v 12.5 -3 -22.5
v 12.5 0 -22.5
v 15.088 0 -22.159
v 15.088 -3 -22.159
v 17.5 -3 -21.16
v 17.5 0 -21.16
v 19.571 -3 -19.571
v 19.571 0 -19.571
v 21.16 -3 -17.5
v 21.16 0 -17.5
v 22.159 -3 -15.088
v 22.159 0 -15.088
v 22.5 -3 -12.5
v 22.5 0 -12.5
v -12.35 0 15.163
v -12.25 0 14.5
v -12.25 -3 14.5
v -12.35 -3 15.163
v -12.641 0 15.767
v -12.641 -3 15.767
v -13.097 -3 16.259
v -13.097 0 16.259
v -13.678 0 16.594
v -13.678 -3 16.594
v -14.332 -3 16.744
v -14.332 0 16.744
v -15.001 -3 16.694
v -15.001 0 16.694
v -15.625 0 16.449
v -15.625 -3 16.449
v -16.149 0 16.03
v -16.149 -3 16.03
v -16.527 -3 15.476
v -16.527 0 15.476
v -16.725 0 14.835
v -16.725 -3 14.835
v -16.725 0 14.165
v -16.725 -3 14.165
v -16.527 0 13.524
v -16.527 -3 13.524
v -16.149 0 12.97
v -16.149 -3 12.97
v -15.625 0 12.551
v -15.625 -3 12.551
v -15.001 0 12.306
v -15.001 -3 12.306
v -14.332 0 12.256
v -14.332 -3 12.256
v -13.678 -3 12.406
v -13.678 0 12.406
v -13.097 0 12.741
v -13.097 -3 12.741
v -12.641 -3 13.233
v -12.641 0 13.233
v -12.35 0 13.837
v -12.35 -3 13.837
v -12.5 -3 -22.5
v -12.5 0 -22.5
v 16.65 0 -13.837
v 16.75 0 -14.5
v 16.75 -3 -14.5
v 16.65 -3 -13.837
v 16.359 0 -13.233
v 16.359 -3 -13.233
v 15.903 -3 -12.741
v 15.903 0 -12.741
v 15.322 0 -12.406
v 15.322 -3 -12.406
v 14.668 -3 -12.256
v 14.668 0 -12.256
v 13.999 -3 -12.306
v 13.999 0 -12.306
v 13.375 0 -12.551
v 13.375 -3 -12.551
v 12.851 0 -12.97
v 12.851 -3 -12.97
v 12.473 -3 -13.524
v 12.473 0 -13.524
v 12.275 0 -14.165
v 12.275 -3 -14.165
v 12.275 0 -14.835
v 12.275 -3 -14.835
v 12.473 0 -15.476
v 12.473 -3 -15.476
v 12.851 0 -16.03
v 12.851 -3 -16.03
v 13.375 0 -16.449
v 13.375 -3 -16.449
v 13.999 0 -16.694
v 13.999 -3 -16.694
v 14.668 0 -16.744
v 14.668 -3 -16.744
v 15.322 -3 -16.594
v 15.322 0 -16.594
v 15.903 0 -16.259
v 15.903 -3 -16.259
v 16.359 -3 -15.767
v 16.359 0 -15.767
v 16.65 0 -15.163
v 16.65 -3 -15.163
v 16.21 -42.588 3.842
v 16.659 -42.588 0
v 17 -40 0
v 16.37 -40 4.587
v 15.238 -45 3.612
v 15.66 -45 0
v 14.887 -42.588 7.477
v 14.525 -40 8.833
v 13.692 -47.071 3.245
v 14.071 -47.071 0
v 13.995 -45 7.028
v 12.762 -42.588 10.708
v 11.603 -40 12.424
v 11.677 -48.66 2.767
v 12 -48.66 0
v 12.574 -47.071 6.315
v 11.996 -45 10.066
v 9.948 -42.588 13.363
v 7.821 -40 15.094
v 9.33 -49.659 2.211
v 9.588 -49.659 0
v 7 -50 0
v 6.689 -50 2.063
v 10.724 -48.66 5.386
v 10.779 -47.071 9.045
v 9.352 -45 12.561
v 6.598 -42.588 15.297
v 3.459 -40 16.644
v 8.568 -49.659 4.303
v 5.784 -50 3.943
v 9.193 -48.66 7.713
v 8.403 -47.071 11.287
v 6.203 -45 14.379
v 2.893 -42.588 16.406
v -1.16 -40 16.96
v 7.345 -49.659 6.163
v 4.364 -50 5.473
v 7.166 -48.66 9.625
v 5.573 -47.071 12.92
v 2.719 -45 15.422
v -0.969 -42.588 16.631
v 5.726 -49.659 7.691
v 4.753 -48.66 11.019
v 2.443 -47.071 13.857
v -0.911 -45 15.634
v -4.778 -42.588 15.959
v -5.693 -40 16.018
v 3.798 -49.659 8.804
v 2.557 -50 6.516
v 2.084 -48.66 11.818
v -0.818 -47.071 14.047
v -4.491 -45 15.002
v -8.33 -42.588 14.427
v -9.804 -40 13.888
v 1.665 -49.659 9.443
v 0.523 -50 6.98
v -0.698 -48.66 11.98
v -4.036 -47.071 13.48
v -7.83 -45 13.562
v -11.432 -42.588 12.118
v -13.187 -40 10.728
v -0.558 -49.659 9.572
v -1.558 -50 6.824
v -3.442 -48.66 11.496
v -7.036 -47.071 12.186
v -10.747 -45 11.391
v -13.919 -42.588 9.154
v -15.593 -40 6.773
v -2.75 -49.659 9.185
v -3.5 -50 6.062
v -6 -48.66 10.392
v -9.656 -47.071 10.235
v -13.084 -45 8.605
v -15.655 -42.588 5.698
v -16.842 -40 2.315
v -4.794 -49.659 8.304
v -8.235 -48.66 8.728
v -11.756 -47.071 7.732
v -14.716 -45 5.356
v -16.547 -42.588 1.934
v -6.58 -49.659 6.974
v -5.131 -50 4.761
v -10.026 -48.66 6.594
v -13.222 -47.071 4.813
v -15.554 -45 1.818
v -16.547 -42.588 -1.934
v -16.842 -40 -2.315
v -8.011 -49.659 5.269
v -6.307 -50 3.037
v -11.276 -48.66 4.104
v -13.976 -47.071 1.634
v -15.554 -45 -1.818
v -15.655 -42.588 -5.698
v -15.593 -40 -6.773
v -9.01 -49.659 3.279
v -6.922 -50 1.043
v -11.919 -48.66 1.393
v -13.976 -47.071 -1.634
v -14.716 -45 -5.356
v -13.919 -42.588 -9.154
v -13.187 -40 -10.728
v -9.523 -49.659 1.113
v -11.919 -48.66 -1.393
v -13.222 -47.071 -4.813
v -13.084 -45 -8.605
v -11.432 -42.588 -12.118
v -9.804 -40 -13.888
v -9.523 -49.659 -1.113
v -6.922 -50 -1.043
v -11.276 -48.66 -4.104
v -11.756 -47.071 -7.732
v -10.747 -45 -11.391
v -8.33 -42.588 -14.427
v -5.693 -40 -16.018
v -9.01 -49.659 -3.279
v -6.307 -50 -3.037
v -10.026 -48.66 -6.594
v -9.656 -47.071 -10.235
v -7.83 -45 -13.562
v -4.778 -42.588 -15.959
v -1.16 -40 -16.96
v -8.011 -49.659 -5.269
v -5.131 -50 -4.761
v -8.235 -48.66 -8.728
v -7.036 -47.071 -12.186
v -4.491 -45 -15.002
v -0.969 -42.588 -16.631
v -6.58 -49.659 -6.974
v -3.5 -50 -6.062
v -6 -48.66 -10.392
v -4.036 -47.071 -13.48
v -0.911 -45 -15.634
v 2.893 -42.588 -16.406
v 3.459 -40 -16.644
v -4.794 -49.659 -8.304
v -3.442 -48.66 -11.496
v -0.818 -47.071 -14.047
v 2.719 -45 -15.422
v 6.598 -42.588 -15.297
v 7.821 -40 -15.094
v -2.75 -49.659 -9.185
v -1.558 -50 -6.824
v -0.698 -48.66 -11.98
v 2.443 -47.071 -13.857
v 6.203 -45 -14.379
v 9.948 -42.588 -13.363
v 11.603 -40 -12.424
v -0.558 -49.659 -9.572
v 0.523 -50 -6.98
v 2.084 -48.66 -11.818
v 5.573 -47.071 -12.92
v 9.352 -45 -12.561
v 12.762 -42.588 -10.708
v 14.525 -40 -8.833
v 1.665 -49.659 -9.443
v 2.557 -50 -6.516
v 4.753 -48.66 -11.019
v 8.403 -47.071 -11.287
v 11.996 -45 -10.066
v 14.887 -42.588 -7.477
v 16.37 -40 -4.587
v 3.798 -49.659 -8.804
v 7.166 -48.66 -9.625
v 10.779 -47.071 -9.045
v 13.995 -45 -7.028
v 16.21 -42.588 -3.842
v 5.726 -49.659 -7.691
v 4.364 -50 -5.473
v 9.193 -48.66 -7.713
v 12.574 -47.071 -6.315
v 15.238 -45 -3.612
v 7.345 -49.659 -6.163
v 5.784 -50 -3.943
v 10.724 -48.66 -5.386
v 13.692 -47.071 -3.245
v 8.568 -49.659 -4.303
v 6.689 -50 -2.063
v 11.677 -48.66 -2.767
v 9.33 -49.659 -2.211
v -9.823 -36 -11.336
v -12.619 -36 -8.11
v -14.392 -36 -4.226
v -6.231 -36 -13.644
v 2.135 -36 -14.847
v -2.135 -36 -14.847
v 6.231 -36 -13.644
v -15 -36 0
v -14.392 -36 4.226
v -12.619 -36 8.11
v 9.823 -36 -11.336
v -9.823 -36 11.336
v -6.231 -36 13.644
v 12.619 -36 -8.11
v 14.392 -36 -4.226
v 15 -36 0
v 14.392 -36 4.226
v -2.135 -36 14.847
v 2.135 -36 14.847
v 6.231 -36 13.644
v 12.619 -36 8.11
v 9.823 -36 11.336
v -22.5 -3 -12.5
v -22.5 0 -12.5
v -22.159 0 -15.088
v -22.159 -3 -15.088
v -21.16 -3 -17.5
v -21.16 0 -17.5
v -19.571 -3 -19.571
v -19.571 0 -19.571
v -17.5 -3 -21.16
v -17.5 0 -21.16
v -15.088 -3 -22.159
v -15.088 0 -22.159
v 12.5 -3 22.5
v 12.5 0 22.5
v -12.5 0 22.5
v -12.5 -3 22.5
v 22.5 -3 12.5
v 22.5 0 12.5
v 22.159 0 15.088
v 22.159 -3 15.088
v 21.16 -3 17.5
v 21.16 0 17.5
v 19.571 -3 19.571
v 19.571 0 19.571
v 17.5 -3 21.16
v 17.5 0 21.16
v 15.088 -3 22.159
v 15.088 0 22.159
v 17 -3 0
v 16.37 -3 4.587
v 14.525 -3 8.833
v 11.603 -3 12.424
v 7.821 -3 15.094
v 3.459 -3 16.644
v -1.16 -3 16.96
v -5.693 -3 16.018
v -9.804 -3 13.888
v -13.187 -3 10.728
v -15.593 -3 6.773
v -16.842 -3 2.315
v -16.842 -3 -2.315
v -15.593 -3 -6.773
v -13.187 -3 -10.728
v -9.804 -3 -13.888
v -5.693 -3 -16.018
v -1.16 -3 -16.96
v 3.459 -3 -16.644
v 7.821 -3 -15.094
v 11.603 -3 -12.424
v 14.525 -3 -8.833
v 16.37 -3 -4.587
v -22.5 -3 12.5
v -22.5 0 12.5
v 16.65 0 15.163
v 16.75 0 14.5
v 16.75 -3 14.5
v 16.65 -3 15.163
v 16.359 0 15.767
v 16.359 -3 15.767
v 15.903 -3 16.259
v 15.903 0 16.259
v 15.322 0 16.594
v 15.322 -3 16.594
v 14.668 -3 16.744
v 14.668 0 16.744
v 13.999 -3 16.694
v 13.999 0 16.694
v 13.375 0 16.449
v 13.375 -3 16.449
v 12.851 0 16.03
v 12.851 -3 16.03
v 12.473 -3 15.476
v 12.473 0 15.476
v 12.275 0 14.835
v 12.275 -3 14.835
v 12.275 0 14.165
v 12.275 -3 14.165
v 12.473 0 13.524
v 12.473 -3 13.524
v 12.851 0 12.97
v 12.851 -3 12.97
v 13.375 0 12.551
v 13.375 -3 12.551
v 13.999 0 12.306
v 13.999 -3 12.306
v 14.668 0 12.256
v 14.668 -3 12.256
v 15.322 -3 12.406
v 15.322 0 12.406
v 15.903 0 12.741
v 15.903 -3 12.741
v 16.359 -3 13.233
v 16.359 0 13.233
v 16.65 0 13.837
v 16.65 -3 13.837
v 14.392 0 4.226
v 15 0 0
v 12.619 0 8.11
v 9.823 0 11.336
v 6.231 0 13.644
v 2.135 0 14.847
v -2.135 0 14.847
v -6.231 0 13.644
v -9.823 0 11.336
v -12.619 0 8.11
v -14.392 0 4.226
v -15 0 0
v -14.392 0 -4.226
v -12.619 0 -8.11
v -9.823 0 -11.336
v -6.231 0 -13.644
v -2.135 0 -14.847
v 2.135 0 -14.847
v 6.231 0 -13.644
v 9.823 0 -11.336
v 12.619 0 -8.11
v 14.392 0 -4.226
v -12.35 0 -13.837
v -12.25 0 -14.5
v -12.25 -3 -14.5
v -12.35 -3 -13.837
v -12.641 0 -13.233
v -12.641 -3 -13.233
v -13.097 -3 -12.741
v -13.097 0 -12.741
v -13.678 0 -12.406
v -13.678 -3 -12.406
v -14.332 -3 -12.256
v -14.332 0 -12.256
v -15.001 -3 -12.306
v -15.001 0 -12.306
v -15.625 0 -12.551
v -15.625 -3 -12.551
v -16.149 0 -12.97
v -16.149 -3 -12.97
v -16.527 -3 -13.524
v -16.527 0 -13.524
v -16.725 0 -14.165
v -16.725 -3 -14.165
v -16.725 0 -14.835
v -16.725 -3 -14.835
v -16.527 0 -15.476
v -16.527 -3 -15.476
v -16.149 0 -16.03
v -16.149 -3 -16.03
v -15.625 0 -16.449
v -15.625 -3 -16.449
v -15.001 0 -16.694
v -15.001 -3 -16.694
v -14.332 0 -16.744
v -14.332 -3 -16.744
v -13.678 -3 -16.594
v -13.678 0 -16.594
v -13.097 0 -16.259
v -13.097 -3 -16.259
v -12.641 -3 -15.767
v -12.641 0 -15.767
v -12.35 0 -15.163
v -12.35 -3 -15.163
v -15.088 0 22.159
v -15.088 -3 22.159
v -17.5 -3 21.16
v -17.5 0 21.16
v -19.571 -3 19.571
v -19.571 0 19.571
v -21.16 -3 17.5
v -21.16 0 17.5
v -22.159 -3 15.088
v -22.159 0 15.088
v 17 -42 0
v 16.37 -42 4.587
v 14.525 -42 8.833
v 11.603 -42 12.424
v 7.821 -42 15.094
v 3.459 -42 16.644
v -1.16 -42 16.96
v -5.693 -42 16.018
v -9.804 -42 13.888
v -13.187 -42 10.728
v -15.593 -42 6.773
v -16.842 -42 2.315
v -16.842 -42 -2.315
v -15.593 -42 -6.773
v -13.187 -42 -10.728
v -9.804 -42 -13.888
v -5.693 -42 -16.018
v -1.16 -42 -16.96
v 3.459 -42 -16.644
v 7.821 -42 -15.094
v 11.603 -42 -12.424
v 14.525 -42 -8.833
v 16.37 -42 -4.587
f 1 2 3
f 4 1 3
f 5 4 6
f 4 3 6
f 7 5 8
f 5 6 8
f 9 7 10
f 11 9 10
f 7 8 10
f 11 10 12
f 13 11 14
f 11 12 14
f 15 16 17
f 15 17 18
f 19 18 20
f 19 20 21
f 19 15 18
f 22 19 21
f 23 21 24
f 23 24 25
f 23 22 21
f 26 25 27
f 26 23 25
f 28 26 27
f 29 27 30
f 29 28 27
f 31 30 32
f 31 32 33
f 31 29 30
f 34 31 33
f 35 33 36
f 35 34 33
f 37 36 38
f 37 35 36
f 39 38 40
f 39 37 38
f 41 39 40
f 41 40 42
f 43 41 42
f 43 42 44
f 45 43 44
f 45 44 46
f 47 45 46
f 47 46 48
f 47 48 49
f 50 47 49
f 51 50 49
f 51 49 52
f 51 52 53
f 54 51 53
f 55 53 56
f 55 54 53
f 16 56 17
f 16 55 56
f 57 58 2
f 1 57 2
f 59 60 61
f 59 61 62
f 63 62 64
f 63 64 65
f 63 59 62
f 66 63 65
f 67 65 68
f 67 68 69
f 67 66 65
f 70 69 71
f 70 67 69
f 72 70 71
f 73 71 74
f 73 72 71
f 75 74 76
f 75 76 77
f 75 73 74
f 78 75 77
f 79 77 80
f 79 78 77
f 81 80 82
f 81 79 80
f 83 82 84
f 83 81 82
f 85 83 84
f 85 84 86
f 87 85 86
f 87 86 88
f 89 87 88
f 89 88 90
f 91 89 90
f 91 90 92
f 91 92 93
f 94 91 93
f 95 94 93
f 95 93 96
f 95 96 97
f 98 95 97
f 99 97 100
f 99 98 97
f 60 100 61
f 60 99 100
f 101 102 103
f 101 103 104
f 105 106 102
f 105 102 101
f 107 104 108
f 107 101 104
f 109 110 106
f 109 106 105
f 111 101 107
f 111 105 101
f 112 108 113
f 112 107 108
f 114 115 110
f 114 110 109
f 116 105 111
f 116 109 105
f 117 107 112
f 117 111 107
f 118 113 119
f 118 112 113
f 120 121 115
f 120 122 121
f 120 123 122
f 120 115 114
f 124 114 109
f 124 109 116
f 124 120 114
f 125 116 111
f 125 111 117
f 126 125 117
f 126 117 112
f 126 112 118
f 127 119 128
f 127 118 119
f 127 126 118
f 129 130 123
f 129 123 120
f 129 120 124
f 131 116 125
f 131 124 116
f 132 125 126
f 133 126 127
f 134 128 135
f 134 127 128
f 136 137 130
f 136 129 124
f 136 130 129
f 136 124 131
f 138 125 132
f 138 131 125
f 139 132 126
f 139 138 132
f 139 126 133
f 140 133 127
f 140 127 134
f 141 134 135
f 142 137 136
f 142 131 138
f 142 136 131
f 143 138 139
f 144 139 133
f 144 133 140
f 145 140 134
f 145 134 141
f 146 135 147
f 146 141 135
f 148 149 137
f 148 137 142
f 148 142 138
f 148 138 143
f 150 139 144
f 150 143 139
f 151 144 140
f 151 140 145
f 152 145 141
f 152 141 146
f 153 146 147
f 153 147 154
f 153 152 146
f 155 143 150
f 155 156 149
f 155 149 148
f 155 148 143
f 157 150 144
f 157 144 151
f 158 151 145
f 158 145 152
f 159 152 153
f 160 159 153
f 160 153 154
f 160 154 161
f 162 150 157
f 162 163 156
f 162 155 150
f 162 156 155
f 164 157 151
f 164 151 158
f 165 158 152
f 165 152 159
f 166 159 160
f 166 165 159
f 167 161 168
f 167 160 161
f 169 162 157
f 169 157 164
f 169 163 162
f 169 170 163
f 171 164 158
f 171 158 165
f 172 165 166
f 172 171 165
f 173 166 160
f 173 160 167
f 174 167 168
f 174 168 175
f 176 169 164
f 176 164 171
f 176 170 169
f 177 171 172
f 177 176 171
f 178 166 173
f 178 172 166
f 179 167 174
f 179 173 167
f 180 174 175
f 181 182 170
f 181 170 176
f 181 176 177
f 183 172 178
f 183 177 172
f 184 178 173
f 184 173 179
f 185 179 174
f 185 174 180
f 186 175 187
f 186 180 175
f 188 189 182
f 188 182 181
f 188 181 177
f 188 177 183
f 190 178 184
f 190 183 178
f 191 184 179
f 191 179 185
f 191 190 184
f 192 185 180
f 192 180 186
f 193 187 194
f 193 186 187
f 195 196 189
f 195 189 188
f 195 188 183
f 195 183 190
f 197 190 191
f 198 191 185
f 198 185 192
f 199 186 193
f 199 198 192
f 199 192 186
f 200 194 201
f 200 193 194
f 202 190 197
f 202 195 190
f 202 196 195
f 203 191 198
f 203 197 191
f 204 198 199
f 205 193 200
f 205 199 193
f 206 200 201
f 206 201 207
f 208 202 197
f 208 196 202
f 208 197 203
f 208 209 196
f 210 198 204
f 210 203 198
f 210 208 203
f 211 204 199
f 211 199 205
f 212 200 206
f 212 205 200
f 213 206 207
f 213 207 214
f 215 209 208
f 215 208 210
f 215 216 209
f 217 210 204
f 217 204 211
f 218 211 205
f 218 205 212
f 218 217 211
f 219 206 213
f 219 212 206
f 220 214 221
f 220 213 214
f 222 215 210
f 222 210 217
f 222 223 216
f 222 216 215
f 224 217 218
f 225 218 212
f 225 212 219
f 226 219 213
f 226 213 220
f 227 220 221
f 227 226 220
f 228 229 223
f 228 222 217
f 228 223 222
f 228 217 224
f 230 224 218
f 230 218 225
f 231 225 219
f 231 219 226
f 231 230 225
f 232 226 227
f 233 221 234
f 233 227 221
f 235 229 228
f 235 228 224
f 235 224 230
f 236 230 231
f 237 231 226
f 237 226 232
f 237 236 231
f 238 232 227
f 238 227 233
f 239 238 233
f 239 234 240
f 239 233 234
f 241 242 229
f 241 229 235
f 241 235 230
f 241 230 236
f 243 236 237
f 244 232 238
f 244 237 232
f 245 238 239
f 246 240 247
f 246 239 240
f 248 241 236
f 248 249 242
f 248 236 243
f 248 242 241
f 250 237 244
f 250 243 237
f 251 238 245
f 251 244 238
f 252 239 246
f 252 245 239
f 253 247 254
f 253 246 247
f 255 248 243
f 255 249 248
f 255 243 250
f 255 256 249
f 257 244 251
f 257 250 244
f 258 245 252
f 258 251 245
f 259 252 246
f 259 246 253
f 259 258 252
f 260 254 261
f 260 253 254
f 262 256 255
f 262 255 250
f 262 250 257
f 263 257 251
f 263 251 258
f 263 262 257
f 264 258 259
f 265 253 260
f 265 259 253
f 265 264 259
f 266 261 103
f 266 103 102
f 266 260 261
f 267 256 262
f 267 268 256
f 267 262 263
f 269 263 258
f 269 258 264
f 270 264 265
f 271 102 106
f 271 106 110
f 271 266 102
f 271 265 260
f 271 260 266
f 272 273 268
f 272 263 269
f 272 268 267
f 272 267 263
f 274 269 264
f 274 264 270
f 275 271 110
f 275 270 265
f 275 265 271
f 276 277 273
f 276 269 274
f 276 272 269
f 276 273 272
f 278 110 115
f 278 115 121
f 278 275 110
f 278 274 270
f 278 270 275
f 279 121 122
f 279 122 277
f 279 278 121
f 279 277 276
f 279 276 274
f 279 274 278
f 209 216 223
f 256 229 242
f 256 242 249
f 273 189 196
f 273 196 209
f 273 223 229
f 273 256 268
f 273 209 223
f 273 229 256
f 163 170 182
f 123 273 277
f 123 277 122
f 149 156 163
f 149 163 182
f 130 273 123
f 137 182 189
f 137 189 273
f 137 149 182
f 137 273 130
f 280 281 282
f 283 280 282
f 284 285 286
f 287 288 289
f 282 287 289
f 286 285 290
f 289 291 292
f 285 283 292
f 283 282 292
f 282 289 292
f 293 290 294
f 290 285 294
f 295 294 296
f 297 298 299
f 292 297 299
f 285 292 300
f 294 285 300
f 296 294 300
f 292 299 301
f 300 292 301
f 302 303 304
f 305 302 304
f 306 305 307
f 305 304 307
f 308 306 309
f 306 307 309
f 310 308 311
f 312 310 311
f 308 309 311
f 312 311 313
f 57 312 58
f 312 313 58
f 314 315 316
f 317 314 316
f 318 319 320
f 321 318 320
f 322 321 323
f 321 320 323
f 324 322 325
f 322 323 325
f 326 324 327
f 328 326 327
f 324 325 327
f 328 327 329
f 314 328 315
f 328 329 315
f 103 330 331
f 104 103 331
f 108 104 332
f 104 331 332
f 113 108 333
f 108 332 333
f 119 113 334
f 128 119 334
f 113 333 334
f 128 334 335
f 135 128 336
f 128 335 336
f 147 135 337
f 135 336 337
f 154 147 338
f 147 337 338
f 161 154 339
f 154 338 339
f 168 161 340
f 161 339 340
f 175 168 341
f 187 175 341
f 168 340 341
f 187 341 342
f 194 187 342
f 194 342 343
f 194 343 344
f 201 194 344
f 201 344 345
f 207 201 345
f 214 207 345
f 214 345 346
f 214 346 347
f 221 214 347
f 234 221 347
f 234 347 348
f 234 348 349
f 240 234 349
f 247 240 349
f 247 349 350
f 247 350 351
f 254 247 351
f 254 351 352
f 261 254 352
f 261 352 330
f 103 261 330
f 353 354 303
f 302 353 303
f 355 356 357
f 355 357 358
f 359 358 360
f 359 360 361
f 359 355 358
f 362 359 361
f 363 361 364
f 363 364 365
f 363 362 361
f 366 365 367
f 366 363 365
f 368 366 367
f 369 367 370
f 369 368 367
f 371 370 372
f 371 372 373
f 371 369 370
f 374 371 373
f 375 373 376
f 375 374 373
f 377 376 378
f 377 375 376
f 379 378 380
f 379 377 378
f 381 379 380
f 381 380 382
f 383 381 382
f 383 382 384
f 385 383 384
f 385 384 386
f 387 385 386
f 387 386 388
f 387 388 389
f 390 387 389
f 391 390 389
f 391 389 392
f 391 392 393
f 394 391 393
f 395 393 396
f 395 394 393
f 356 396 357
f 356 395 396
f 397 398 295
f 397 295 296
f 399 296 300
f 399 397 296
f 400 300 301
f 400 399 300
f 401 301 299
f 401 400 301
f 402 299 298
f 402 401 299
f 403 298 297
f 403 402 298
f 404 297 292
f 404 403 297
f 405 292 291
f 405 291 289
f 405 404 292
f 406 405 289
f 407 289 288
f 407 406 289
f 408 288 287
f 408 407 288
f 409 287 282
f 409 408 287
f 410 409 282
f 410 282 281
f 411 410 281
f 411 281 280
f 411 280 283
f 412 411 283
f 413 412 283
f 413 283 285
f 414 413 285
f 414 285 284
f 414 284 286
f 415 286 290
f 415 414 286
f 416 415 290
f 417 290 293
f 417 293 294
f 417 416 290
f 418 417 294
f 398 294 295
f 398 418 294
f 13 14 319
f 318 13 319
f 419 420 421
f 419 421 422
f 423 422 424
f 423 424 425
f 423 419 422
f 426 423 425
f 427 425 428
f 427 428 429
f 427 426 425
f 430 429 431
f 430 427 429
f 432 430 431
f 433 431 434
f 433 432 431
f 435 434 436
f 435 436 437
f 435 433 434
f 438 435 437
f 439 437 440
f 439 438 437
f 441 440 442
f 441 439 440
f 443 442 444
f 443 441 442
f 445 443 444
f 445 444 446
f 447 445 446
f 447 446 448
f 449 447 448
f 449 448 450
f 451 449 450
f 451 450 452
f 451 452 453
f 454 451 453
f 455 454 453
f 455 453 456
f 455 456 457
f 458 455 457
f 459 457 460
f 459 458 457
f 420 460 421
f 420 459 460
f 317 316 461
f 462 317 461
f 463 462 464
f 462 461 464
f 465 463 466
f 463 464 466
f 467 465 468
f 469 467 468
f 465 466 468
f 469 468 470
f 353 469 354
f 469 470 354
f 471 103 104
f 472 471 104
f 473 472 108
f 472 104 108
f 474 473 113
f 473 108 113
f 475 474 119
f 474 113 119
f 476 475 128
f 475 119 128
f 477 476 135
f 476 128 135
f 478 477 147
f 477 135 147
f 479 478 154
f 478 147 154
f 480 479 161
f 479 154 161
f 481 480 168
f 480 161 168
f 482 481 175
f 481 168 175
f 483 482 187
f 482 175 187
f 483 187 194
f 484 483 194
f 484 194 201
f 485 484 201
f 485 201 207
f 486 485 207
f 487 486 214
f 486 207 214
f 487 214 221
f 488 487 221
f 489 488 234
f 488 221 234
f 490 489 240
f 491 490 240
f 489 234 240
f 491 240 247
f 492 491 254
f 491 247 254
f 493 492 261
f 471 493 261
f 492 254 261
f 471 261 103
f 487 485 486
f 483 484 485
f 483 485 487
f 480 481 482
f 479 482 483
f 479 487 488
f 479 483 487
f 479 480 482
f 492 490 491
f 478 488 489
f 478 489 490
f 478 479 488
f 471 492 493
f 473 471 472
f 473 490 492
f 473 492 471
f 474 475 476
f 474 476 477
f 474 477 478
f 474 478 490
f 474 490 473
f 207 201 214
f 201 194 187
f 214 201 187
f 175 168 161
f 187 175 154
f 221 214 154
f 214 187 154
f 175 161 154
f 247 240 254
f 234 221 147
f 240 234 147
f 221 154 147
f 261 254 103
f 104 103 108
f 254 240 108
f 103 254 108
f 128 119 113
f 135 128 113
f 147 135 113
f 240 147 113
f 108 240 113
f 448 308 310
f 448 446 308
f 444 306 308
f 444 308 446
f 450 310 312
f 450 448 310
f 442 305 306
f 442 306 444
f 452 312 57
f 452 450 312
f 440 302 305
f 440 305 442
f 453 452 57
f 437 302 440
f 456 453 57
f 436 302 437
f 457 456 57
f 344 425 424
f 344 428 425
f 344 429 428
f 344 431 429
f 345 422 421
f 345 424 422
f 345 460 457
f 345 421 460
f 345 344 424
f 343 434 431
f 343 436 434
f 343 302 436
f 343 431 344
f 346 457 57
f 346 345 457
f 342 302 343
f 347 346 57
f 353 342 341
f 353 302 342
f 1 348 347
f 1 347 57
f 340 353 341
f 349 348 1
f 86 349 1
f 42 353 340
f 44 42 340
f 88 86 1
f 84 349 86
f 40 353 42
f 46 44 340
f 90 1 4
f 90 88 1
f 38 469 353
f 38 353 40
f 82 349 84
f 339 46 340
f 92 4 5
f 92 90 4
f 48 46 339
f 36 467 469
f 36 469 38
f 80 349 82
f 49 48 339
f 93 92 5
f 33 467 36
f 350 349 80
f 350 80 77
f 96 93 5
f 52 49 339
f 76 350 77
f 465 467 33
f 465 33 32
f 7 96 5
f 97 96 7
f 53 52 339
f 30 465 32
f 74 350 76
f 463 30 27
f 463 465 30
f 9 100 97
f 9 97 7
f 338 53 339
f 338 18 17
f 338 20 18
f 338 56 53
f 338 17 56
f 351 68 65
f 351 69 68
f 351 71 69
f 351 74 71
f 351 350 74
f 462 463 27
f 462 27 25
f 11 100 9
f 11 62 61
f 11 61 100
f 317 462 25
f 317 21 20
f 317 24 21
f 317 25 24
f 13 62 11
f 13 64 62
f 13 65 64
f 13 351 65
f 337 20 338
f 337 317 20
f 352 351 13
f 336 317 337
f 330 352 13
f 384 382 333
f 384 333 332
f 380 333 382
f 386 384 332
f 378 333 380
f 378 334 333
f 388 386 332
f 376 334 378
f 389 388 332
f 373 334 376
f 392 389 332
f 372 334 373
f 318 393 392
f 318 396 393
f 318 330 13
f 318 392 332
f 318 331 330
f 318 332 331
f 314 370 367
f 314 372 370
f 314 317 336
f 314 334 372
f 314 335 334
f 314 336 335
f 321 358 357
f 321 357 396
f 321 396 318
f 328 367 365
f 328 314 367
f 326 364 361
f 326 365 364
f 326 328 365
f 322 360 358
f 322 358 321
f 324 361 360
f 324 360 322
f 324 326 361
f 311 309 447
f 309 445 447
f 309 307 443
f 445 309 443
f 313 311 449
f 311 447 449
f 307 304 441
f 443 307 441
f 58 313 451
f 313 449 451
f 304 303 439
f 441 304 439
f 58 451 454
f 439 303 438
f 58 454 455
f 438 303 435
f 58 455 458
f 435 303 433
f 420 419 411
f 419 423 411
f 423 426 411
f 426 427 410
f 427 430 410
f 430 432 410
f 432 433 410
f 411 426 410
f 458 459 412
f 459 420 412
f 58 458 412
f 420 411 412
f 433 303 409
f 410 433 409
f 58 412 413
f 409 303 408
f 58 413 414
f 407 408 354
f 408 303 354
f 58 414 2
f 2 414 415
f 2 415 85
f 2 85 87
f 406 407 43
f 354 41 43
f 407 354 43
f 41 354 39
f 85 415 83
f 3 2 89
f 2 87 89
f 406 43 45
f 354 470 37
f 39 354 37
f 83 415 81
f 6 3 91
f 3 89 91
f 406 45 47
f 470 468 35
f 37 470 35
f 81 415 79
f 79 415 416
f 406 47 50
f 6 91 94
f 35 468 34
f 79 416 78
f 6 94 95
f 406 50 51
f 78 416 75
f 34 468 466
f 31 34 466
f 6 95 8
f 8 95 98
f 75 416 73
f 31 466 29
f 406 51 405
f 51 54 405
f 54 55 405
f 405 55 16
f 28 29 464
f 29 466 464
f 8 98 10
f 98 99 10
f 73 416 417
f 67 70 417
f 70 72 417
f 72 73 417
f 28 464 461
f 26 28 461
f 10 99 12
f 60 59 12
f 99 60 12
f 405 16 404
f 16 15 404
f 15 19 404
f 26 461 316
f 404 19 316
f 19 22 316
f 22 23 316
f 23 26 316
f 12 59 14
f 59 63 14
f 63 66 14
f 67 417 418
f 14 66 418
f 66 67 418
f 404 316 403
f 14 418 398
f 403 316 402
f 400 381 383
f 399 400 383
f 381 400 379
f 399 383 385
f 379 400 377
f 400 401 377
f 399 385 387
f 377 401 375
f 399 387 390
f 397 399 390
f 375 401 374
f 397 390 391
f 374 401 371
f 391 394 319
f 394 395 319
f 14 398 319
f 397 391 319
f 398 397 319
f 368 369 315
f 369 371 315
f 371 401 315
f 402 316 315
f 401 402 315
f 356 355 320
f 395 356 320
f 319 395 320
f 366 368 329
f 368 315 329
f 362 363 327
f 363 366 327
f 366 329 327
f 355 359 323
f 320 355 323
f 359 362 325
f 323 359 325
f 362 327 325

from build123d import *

# Parameters (mm, degrees)
F0_R     = 2.25
F0_R_2   = 17
F1_DEPTH = 3
F0_R_3   = 15
F0_R_4   = 1.75
F2_DEPTH = 50
F3_DEPTH = 36
F4_R     = 10
F5_R     = 17
F5_R_2   = 15
F5_R_3   = 1.75
F6_DEPTH = 2


with BuildPart() as f1:
    # F0 (on Front) → F1 (new body)
    with BuildSketch(Plane.XZ):
        with BuildLine():
            ThreePointArc((22.5, 12.5), (19.5710678119, 19.5710678119), (12.5, 22.5))
            Line((12.5, 22.5), (-12.5, 22.5))
            ThreePointArc((-12.5, 22.5), (-19.5710678119, 19.5710678119), (-22.5, 12.5))
            Line((-22.5, 12.5), (-22.5, -12.5))
            ThreePointArc((-22.5, -12.5), (-19.5710678119, -19.5710678119), (-12.5, -22.5))
            Line((-12.5, -22.5), (12.5, -22.5))
            ThreePointArc((12.5, -22.5), (19.5710678119, -19.5710678119), (22.5, -12.5))
            Line((22.5, -12.5), (22.5, 12.5))
        make_face()
        with Locations((-14.5, -14.5)):
            Circle(F0_R, mode=Mode.SUBTRACT)
        with Locations((14.5, -14.5)):
            Circle(F0_R, mode=Mode.SUBTRACT)
        with Locations((-14.5, 14.5)):
            Circle(F0_R, mode=Mode.SUBTRACT)
        Circle(F0_R_2, mode=Mode.SUBTRACT)
        with Locations((14.5, 14.5)):
            Circle(F0_R, mode=Mode.SUBTRACT)
    extrude(amount=F1_DEPTH)

    # F0 (on Front) → F2 (join)
    with BuildSketch(Plane.XZ):
        Circle(F0_R_2)
        Circle(F0_R_3, mode=Mode.SUBTRACT)
        Circle(F0_R_3)
        Circle(F0_R_4, mode=Mode.SUBTRACT)
        Circle(F0_R_4)
    extrude(amount=F2_DEPTH)

    # F0 (on Front) → F3 (cut)
    with BuildSketch(Plane.XZ):
        Circle(F0_R_3)
        Circle(F0_R_4, mode=Mode.SUBTRACT)
        Circle(F0_R_4)
    extrude(amount=F3_DEPTH, mode=Mode.SUBTRACT)

    # F4
    f4_edges = [f1.edges().sort_by_distance(p)[0] for p in [
        (-17, -50, 0),
    ]]
    fillet(f4_edges, radius=F4_R)


with BuildPart() as f6:
    # F5 (on Front) → F6 (new body)
    with BuildSketch(Plane.XZ):
        Circle(F5_R)
        Circle(F5_R_2, mode=Mode.SUBTRACT)
        Circle(F5_R_2)
        Circle(F5_R_3, mode=Mode.SUBTRACT)
        Circle(F5_R_3)
    extrude(amount=F6_DEPTH)


with BuildPart() as f6_1:
    # F7: moved
    add(f6.part.moved(Location((0, -40, 0))))


solid = Compound([f1.part, f6_1.part])
